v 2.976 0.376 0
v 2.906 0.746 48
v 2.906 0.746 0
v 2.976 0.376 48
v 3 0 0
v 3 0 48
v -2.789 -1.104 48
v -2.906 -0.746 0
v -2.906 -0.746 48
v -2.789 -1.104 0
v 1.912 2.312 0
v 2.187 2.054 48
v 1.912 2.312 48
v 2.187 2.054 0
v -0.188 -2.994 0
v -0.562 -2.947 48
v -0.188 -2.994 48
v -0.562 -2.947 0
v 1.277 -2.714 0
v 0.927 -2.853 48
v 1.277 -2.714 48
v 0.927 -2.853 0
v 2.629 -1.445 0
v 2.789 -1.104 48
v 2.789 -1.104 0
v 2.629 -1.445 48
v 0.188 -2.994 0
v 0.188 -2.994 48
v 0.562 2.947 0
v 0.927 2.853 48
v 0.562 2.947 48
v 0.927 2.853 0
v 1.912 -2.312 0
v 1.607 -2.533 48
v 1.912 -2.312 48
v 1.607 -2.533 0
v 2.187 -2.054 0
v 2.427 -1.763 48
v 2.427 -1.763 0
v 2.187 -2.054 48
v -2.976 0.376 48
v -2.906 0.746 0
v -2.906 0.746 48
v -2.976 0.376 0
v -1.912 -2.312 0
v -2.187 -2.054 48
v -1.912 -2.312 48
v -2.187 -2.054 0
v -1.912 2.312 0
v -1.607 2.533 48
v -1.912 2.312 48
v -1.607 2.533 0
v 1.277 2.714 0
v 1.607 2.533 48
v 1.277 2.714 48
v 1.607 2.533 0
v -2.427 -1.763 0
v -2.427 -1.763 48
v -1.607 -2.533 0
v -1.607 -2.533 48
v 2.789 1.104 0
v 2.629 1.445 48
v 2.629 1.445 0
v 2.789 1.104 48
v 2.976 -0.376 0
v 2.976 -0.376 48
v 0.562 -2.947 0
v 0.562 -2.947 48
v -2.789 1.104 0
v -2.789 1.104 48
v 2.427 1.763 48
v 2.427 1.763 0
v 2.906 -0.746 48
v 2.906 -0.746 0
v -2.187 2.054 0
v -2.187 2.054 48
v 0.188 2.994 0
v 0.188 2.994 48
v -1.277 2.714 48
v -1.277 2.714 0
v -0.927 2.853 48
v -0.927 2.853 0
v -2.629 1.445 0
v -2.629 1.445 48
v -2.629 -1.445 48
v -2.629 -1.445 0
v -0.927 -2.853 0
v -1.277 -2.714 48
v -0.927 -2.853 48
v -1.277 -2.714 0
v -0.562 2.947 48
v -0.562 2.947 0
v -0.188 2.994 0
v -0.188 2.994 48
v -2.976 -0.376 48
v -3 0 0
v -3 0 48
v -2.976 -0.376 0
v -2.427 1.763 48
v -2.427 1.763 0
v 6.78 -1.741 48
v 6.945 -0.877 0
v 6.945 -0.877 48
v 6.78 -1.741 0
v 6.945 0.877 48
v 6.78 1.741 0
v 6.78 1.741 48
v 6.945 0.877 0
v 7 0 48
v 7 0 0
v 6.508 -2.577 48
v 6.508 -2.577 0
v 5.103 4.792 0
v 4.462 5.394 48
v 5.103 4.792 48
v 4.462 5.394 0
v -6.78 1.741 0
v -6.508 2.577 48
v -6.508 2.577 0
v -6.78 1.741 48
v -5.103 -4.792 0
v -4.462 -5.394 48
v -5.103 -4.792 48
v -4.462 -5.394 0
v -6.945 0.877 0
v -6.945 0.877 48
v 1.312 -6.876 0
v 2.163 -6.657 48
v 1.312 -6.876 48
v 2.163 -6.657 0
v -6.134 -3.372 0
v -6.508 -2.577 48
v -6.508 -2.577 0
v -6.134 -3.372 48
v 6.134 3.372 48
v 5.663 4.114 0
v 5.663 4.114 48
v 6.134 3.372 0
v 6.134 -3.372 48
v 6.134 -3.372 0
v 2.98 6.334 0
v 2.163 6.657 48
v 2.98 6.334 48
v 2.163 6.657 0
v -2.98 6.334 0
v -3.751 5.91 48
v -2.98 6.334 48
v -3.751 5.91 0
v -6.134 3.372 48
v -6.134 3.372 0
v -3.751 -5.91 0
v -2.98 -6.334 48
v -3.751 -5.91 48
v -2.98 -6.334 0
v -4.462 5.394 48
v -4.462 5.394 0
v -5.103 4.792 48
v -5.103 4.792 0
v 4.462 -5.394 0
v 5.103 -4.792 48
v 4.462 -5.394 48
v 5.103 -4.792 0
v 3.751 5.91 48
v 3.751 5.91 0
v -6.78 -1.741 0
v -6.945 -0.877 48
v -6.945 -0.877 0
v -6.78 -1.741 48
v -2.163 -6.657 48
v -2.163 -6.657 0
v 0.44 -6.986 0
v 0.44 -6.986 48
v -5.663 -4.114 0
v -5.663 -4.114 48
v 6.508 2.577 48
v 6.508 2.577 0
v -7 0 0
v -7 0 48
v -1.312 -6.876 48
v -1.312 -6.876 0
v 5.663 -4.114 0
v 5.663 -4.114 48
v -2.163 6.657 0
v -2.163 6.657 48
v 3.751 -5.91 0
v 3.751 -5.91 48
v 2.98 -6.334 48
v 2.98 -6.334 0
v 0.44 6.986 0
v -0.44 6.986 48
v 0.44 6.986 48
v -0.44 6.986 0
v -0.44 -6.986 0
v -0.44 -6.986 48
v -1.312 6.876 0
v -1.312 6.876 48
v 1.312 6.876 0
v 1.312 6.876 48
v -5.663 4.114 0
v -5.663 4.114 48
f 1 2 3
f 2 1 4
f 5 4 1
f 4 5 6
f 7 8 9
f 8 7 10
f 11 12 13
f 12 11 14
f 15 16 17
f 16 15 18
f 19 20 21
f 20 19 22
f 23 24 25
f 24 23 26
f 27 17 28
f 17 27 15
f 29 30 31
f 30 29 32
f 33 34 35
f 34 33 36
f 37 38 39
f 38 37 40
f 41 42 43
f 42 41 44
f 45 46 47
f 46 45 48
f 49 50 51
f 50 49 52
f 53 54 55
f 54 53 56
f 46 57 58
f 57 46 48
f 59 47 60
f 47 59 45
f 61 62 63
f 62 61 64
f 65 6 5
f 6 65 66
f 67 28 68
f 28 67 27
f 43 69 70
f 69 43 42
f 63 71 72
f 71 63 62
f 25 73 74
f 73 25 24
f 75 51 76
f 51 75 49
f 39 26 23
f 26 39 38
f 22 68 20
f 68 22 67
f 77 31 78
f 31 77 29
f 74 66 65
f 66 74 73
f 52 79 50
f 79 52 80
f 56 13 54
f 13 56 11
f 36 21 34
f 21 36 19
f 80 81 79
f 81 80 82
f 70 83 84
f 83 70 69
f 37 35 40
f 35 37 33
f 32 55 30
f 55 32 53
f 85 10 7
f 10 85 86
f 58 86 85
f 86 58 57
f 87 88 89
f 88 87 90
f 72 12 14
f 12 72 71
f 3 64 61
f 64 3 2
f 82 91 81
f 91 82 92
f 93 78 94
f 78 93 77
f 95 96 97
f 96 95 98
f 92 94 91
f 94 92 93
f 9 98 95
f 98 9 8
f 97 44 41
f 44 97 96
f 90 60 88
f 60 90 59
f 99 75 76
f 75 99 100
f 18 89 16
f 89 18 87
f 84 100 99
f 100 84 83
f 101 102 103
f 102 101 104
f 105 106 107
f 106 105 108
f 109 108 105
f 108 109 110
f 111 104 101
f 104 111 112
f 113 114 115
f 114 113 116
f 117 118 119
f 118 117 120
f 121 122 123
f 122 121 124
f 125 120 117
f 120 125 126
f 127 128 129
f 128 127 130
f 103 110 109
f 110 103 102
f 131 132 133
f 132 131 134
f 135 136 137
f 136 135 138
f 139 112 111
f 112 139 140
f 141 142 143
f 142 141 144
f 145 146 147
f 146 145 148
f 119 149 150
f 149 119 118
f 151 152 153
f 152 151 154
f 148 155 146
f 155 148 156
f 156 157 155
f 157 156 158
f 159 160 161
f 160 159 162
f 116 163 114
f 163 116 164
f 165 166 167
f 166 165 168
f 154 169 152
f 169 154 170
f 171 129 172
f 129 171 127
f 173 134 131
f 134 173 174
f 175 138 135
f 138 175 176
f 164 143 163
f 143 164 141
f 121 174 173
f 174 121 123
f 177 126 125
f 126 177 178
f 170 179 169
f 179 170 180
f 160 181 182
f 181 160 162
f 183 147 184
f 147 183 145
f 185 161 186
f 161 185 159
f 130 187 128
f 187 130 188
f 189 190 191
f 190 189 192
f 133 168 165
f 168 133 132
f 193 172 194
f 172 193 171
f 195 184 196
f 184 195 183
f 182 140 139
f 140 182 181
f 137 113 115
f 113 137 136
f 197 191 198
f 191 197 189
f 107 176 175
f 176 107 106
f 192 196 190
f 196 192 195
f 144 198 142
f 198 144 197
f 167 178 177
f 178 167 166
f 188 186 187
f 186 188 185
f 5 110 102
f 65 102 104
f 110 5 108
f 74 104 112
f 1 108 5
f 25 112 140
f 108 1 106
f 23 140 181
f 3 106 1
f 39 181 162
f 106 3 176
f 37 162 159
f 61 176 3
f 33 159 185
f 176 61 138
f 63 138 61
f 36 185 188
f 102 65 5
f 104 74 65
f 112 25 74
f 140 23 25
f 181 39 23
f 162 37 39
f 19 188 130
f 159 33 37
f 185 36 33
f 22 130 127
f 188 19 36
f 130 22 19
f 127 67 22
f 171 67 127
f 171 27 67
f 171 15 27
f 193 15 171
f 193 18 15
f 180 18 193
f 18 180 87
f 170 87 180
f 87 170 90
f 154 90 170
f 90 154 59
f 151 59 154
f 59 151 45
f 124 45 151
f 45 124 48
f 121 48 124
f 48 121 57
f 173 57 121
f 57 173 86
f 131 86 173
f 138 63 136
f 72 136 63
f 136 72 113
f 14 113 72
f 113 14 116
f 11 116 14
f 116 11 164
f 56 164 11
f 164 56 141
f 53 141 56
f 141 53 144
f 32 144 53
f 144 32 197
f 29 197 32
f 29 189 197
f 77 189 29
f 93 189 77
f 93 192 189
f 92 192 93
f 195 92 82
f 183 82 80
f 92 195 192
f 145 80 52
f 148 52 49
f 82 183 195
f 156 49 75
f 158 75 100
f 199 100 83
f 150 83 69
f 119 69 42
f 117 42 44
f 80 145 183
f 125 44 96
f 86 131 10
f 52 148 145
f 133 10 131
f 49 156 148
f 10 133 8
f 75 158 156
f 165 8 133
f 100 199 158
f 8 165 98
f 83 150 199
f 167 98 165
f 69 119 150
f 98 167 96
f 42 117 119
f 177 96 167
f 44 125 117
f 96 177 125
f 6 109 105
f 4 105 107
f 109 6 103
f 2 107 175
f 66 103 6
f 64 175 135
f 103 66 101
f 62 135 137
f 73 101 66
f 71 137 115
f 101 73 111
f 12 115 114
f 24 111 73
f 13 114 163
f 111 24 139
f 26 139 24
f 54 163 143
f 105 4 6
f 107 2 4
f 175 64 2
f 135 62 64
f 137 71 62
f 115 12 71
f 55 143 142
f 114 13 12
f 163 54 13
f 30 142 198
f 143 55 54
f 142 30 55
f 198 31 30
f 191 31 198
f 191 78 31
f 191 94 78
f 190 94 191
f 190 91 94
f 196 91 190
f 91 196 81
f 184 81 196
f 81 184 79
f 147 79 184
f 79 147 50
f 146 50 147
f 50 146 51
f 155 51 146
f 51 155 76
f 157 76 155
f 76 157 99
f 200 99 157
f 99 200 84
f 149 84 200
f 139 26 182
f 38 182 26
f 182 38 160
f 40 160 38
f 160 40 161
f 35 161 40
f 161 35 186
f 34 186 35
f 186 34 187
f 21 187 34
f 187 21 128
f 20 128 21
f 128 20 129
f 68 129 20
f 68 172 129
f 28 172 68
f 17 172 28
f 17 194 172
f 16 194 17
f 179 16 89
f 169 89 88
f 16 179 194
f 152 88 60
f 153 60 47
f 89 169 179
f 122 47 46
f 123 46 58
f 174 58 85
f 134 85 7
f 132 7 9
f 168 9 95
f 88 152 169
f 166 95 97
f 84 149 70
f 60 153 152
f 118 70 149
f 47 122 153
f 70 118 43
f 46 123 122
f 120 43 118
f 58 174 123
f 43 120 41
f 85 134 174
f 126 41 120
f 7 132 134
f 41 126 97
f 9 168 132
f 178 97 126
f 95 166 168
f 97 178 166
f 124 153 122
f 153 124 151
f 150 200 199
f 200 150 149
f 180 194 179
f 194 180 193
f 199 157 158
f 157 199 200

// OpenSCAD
$fn = 50;

difference() {
	union() {
		cylinder(h = 48, r = 7.0);
	}
	union() {
		translate(v = [0, 0, -100]) {
			cylinder(h = 200, r = 3.0);
		}
		translate(v = [0, 0, -100]) {
			cylinder(h = 200, r = 1.5);
		}
	}
}
